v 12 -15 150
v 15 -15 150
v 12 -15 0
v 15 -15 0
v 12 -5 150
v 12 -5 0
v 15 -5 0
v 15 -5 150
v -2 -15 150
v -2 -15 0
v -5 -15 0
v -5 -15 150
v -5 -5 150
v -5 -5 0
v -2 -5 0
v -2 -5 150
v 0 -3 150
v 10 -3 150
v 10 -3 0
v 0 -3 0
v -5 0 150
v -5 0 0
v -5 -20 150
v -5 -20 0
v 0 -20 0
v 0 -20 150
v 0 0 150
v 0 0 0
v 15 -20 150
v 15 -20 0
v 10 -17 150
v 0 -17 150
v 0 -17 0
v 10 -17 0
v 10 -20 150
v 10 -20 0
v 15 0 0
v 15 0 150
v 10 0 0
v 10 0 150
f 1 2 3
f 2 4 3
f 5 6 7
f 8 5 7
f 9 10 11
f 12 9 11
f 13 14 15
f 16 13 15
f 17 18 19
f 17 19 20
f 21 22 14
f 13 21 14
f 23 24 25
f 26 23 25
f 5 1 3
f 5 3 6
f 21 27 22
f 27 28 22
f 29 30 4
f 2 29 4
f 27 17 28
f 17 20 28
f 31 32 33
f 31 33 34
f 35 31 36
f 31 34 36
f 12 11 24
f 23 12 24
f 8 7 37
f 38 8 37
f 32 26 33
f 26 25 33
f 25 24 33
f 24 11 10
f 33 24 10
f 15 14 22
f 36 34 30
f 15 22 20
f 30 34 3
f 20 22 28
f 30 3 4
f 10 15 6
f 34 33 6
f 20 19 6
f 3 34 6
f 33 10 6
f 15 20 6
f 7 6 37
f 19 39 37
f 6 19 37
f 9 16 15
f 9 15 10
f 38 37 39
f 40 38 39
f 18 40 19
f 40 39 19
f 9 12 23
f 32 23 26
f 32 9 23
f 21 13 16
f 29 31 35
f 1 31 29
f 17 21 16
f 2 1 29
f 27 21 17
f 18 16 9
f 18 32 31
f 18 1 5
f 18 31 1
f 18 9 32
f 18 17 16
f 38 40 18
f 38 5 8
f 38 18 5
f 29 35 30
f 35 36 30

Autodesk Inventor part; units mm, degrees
ref_plane "YZ Plane" through (0, 0, 0) normal (1, 0, 0) x (0, 1, 0)
ref_plane "XZ Plane" through (0, 0, 0) normal (0, 1, 0) x (-1, 0, 0)
ref_plane "XY Plane" through (0, 0, 0) normal (0, 0, 1) x (1, 0, 0)
sketch "Esboço1" plane through (0, 0, 0) normal (0, 0, 1) x (1, 0, 0)
  line L0 (0, 0) -> (-5, 0)
  line L1 (-5, 0) -> (-5, -5)
  line L2 (-5, -5) -> (-2, -5)
  line L3 (-2, -5) -> (-2, -15)
  line L4 (-2, -15) -> (-5, -15)
  line L5 (-5, -15) -> (-5, -20)
  line L6 (-5, -20) -> (0, -20)
  line L7 (0, -20) -> (0, -17)
  line L8 (0, -17) -> (10, -17)
  line L9 (10, -17) -> (10, -20)
  line L10 (10, -20) -> (15, -20)
  line L11 (15, -20) -> (15, -15)
  line L12 (15, -15) -> (12, -15)
  line L13 (12, -15) -> (12, -5)
  line L14 (12, -5) -> (15, -5)
  line L15 (15, -5) -> (15, 0)
  line L16 (15, 0) -> (10, 0)
  line L17 (10, 0) -> (10, -3)
  line L18 (10, -3) -> (0, -3)
  line L19 (0, -3) -> (0, 0)
  dimension "d4" = 5
  dimension "d5" = 5
  dimension "d6" = 3
  dimension "d7" = 10
  dimension "d8" = 3
  dimension "d9" = 5
  dimension "d10" = 5
  dimension "d11" = 3
  dimension "d12" = 10
  dimension "d13" = 5
  dimension "d14" = 5
  dimension "d15" = 3
  dimension "d16" = 10
  dimension "d17" = 3
  dimension "d18" = 5
  dimension "d19" = 3
  dimension "d20" = 10
extrude "Extrusão1" add sketch "Esboço1" along normal blind 150
properties part number "Viga Projeto Bosch"
